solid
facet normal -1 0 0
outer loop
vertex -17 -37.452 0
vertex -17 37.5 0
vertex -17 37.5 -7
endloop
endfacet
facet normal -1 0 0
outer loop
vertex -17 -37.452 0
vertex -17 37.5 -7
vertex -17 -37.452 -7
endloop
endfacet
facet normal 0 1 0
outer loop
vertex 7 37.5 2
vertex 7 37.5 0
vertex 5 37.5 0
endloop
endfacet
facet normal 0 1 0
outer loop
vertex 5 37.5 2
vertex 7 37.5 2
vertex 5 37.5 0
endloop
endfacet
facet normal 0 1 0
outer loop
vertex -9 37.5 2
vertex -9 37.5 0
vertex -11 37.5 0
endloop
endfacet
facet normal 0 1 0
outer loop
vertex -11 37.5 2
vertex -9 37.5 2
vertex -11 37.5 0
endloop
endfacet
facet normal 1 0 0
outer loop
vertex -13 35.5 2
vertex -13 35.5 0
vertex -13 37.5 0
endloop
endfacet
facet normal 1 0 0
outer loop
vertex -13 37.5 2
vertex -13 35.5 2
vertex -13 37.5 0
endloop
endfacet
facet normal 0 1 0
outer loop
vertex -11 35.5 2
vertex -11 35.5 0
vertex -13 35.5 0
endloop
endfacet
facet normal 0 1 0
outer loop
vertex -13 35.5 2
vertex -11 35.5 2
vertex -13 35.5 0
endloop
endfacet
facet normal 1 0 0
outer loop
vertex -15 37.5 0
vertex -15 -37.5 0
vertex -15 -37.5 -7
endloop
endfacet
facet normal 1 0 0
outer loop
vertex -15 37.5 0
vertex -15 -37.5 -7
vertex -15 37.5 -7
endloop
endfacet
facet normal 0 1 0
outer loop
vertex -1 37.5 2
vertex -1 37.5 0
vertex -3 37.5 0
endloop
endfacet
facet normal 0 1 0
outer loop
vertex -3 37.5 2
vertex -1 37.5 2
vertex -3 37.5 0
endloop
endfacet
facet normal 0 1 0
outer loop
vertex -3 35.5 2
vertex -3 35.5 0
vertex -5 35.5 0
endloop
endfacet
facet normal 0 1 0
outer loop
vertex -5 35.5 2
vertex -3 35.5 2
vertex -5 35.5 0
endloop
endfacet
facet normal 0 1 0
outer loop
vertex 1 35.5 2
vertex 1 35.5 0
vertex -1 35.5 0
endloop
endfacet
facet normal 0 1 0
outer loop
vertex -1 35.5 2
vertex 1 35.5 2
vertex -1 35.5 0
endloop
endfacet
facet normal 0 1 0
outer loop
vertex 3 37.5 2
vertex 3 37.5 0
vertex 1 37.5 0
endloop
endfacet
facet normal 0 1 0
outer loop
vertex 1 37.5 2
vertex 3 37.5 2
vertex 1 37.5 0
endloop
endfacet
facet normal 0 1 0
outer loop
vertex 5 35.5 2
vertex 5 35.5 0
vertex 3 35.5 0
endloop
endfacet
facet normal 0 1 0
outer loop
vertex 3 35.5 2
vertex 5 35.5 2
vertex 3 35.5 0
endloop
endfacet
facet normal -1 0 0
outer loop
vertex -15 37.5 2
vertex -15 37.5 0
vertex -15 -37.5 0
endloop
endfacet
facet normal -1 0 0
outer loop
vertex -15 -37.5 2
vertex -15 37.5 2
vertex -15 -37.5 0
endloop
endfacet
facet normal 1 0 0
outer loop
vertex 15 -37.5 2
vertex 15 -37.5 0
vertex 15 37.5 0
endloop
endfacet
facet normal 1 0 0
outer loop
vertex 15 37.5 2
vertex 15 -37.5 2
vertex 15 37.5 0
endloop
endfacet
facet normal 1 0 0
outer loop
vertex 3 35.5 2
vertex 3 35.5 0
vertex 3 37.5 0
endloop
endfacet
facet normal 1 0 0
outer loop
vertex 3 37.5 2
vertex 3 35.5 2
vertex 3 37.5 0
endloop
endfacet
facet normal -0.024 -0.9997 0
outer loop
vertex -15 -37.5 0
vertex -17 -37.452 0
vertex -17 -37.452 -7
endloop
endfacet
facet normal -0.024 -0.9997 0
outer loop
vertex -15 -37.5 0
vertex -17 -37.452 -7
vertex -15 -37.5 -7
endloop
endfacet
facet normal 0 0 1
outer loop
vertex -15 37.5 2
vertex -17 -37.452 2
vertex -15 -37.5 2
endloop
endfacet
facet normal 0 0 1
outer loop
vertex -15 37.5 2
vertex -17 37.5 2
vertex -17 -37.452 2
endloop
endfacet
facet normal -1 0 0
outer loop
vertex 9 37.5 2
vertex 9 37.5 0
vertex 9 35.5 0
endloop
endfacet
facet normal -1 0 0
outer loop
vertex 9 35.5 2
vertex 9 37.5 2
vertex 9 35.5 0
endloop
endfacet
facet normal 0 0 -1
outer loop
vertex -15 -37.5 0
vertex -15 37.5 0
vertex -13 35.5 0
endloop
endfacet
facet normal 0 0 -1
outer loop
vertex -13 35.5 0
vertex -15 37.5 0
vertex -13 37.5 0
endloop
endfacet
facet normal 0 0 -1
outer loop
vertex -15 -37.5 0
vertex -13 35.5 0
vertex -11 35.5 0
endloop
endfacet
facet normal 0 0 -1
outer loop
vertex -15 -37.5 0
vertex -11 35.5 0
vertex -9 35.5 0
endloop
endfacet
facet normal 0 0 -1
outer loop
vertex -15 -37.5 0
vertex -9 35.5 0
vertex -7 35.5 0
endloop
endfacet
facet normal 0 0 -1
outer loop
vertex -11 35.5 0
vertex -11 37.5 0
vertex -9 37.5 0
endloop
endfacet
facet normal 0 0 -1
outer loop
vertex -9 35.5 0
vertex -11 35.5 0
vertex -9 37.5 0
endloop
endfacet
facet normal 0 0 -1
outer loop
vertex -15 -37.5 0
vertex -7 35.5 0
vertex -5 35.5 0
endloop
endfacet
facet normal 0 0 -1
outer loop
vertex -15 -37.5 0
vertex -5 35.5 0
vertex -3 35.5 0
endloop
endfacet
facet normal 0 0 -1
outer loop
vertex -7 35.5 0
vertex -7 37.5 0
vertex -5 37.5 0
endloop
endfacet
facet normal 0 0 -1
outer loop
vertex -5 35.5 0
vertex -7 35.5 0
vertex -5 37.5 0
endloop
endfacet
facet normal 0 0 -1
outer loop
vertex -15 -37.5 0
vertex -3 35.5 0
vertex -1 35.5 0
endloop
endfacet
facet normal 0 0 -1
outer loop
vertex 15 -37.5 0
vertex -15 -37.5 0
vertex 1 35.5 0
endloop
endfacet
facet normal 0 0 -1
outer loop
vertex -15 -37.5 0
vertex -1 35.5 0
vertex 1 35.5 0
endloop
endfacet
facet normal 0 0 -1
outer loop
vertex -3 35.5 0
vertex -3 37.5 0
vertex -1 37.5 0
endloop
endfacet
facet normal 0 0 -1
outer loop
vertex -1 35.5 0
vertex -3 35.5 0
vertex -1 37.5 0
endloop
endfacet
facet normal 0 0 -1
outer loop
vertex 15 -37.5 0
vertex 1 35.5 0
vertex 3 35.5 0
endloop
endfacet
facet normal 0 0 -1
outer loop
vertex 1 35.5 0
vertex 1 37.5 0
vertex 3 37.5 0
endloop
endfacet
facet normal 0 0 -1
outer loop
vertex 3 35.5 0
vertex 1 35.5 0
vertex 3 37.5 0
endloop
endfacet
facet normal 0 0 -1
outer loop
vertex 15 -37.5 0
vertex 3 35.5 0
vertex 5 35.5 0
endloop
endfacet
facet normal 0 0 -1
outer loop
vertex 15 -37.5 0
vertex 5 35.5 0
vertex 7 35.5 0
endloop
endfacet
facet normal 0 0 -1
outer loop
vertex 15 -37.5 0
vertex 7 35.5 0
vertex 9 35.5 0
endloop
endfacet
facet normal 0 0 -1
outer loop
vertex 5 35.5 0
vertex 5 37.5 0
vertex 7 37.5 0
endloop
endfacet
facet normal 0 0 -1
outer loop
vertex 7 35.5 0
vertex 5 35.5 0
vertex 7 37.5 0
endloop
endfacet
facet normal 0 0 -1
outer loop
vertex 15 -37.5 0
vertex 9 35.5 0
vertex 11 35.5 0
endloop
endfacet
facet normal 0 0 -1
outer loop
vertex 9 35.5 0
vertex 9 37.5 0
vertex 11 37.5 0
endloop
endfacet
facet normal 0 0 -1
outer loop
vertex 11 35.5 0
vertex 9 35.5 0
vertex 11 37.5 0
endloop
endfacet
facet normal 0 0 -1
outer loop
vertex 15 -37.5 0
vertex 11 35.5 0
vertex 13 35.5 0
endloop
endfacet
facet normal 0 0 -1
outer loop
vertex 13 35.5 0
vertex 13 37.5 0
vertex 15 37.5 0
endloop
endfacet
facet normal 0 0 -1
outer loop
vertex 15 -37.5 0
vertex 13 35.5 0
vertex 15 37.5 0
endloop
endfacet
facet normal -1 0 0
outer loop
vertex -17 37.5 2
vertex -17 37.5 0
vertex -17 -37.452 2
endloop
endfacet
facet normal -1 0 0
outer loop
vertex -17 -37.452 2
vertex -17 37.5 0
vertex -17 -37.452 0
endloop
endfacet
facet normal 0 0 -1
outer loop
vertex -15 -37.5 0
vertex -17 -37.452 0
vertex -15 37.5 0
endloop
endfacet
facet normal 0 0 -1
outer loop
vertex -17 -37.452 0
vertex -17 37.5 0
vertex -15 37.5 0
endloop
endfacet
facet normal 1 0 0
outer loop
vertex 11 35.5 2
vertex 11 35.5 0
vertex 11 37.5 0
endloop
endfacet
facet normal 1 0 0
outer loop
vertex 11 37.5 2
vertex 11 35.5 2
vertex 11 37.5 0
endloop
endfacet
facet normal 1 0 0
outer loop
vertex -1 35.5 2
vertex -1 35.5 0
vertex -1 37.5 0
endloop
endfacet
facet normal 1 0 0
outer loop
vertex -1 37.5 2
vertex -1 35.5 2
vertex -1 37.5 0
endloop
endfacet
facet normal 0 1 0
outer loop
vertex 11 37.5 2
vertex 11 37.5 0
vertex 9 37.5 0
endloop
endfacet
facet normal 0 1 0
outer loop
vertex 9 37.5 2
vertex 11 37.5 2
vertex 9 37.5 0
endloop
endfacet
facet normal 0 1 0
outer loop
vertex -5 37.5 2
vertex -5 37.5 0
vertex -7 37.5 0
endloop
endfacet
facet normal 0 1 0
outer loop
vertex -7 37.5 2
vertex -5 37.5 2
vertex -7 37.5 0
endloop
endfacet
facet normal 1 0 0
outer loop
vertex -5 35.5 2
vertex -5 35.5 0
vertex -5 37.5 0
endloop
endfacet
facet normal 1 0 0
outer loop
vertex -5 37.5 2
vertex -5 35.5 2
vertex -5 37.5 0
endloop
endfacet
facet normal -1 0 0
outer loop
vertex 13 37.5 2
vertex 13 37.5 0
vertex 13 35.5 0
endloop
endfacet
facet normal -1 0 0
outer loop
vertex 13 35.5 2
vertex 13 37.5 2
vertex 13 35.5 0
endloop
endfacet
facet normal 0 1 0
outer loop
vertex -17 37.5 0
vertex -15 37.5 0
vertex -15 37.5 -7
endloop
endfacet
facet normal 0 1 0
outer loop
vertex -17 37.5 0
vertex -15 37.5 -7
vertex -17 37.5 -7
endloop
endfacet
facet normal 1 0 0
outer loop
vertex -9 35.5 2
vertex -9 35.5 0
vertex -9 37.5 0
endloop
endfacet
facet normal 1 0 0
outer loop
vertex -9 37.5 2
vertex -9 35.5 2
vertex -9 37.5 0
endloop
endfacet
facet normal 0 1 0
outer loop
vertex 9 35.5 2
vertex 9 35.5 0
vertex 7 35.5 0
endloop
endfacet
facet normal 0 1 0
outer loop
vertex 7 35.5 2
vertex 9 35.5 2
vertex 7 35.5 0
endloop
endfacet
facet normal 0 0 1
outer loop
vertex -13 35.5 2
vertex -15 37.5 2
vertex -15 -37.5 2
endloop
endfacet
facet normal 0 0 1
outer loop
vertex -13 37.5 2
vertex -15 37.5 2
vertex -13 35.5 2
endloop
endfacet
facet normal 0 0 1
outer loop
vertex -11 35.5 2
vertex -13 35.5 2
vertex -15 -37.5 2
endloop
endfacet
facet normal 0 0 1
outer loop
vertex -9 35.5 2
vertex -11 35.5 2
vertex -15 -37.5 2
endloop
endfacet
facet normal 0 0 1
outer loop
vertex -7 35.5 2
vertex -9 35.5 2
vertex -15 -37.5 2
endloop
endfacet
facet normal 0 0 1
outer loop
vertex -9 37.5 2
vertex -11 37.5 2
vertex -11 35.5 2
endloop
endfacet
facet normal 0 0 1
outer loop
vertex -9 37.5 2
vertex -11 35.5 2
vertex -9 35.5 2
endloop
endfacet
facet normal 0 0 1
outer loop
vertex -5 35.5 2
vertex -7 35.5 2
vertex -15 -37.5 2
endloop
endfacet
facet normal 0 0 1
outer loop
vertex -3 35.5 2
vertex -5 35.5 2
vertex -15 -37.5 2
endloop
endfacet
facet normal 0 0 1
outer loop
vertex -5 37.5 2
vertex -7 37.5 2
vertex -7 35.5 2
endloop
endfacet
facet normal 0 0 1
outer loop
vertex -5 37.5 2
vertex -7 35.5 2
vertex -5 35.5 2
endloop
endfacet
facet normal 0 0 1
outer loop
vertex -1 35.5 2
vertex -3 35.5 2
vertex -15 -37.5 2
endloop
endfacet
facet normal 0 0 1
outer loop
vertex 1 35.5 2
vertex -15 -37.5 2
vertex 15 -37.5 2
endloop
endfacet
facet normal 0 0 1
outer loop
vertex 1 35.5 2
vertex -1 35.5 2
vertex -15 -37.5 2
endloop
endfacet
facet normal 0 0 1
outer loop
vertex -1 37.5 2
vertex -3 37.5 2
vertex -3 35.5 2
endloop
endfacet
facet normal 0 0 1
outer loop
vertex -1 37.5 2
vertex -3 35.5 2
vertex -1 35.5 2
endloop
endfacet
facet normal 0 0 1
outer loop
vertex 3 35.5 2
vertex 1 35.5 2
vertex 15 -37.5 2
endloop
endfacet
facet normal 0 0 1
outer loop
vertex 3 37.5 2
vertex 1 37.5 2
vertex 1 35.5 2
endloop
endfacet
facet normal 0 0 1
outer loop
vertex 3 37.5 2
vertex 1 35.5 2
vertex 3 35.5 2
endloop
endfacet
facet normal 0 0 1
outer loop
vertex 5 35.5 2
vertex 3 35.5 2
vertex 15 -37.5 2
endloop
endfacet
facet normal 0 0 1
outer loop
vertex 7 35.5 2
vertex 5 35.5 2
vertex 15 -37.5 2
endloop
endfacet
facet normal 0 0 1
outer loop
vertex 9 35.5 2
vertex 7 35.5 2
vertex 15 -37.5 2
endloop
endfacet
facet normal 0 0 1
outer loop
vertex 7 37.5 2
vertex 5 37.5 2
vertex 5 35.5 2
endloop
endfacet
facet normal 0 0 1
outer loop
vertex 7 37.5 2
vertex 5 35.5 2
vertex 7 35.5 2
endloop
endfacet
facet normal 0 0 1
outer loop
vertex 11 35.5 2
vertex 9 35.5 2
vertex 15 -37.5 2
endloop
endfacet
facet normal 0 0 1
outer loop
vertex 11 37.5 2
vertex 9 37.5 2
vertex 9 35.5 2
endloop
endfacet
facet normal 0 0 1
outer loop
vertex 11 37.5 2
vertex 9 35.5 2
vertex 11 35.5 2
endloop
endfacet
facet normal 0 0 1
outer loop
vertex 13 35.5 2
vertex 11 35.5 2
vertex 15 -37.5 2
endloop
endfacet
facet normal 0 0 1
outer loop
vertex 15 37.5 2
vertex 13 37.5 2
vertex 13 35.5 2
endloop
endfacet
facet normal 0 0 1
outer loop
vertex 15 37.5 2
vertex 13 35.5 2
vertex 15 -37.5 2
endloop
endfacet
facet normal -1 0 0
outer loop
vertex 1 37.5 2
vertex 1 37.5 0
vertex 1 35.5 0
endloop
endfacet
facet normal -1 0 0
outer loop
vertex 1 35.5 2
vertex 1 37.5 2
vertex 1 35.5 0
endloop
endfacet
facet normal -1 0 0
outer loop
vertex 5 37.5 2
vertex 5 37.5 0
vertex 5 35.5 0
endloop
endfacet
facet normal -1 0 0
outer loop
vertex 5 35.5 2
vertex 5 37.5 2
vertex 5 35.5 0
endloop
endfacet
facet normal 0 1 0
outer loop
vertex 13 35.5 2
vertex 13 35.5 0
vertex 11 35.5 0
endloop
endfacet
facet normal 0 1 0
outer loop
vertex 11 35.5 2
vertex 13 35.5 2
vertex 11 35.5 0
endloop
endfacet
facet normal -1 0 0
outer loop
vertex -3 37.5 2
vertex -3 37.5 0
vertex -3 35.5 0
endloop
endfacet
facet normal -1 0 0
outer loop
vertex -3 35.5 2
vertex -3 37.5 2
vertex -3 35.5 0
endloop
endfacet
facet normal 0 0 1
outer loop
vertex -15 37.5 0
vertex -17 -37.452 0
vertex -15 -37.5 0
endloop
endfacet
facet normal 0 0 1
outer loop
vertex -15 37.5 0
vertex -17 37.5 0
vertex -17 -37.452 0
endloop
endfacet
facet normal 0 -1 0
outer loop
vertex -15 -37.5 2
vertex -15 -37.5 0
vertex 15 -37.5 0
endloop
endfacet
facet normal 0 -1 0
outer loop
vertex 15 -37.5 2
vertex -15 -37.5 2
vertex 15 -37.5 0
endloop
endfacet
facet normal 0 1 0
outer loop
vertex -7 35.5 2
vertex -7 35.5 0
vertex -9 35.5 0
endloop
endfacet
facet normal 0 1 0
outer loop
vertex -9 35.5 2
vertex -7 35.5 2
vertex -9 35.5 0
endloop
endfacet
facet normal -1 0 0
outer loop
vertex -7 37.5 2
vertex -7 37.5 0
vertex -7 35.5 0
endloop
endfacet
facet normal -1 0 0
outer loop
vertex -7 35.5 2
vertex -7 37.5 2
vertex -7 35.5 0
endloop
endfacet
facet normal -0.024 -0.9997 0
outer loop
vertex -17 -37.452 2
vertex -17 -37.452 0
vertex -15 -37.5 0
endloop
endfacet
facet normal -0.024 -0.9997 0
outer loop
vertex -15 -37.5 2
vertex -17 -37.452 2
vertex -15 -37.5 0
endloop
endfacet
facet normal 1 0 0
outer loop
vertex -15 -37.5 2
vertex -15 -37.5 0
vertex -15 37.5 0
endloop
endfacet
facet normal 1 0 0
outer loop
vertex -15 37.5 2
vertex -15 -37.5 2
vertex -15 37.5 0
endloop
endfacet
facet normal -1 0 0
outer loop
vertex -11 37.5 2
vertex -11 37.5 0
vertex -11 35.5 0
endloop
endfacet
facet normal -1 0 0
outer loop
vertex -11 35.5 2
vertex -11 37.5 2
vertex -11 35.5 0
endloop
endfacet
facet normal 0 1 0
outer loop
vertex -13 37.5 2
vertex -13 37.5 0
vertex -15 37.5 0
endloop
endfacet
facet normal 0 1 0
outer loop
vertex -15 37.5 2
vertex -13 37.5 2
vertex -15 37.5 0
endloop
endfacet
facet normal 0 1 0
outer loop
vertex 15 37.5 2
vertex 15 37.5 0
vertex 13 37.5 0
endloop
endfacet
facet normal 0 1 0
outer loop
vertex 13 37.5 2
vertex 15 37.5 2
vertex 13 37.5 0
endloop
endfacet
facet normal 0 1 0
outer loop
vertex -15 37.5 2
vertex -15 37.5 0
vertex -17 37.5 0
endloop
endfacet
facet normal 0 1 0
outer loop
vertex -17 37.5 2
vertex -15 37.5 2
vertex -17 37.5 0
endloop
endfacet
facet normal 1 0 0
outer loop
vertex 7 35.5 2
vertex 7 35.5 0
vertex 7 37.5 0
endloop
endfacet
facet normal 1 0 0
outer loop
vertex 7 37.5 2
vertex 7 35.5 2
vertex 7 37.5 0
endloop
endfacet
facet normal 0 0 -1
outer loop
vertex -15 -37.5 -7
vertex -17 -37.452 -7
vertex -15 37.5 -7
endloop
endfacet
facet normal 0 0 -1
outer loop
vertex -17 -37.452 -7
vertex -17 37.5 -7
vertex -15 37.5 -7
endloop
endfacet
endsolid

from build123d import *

# Parameters (mm, degrees)
F1_DEPTH = 2
F2_DEPTH = 7
F3_DEPTH = 2


with BuildPart() as f1:
    # F0 (on Top) → F1 (new body)
    with BuildSketch(Plane.XY):
        Polygon((-15, 37.5), (-15, -37.5), (15, -37.5), (15, 37.5), (13, 37.5), (13, 35.5), (11, 35.5), (11, 37.5), (9, 37.5), (9, 35.5), (7, 35.5), (7, 37.5), (5, 37.5), (5, 35.5), (3, 35.5), (3, 37.5), (1, 37.5), (1, 35.5), (-1, 35.5), (-1, 37.5), (-3, 37.5), (-3, 35.5), (-5, 35.5), (-5, 37.5), (-7, 37.5), (-7, 35.5), (-9, 35.5), (-9, 37.5), (-11, 37.5), (-11, 35.5), (-13, 35.5), (-13, 37.5), align=None)
    extrude(amount=F1_DEPTH)

    # F0 (on Top) → F2 (join)
    with BuildSketch(Plane.XY):
        Polygon((-17, -37.451595), (-15, -37.5), (-15, 37.5), (-17, 37.5), align=None)
    extrude(amount=-F2_DEPTH)


with BuildPart() as f3:
    # F0 (on Top) → F3 (new body)
    with BuildSketch(Plane.XY):
        Polygon((-17, -37.451595), (-15, -37.5), (-15, 37.5), (-17, 37.5), align=None)
    extrude(amount=F3_DEPTH)


solid = Compound([f1.part, f3.part])
